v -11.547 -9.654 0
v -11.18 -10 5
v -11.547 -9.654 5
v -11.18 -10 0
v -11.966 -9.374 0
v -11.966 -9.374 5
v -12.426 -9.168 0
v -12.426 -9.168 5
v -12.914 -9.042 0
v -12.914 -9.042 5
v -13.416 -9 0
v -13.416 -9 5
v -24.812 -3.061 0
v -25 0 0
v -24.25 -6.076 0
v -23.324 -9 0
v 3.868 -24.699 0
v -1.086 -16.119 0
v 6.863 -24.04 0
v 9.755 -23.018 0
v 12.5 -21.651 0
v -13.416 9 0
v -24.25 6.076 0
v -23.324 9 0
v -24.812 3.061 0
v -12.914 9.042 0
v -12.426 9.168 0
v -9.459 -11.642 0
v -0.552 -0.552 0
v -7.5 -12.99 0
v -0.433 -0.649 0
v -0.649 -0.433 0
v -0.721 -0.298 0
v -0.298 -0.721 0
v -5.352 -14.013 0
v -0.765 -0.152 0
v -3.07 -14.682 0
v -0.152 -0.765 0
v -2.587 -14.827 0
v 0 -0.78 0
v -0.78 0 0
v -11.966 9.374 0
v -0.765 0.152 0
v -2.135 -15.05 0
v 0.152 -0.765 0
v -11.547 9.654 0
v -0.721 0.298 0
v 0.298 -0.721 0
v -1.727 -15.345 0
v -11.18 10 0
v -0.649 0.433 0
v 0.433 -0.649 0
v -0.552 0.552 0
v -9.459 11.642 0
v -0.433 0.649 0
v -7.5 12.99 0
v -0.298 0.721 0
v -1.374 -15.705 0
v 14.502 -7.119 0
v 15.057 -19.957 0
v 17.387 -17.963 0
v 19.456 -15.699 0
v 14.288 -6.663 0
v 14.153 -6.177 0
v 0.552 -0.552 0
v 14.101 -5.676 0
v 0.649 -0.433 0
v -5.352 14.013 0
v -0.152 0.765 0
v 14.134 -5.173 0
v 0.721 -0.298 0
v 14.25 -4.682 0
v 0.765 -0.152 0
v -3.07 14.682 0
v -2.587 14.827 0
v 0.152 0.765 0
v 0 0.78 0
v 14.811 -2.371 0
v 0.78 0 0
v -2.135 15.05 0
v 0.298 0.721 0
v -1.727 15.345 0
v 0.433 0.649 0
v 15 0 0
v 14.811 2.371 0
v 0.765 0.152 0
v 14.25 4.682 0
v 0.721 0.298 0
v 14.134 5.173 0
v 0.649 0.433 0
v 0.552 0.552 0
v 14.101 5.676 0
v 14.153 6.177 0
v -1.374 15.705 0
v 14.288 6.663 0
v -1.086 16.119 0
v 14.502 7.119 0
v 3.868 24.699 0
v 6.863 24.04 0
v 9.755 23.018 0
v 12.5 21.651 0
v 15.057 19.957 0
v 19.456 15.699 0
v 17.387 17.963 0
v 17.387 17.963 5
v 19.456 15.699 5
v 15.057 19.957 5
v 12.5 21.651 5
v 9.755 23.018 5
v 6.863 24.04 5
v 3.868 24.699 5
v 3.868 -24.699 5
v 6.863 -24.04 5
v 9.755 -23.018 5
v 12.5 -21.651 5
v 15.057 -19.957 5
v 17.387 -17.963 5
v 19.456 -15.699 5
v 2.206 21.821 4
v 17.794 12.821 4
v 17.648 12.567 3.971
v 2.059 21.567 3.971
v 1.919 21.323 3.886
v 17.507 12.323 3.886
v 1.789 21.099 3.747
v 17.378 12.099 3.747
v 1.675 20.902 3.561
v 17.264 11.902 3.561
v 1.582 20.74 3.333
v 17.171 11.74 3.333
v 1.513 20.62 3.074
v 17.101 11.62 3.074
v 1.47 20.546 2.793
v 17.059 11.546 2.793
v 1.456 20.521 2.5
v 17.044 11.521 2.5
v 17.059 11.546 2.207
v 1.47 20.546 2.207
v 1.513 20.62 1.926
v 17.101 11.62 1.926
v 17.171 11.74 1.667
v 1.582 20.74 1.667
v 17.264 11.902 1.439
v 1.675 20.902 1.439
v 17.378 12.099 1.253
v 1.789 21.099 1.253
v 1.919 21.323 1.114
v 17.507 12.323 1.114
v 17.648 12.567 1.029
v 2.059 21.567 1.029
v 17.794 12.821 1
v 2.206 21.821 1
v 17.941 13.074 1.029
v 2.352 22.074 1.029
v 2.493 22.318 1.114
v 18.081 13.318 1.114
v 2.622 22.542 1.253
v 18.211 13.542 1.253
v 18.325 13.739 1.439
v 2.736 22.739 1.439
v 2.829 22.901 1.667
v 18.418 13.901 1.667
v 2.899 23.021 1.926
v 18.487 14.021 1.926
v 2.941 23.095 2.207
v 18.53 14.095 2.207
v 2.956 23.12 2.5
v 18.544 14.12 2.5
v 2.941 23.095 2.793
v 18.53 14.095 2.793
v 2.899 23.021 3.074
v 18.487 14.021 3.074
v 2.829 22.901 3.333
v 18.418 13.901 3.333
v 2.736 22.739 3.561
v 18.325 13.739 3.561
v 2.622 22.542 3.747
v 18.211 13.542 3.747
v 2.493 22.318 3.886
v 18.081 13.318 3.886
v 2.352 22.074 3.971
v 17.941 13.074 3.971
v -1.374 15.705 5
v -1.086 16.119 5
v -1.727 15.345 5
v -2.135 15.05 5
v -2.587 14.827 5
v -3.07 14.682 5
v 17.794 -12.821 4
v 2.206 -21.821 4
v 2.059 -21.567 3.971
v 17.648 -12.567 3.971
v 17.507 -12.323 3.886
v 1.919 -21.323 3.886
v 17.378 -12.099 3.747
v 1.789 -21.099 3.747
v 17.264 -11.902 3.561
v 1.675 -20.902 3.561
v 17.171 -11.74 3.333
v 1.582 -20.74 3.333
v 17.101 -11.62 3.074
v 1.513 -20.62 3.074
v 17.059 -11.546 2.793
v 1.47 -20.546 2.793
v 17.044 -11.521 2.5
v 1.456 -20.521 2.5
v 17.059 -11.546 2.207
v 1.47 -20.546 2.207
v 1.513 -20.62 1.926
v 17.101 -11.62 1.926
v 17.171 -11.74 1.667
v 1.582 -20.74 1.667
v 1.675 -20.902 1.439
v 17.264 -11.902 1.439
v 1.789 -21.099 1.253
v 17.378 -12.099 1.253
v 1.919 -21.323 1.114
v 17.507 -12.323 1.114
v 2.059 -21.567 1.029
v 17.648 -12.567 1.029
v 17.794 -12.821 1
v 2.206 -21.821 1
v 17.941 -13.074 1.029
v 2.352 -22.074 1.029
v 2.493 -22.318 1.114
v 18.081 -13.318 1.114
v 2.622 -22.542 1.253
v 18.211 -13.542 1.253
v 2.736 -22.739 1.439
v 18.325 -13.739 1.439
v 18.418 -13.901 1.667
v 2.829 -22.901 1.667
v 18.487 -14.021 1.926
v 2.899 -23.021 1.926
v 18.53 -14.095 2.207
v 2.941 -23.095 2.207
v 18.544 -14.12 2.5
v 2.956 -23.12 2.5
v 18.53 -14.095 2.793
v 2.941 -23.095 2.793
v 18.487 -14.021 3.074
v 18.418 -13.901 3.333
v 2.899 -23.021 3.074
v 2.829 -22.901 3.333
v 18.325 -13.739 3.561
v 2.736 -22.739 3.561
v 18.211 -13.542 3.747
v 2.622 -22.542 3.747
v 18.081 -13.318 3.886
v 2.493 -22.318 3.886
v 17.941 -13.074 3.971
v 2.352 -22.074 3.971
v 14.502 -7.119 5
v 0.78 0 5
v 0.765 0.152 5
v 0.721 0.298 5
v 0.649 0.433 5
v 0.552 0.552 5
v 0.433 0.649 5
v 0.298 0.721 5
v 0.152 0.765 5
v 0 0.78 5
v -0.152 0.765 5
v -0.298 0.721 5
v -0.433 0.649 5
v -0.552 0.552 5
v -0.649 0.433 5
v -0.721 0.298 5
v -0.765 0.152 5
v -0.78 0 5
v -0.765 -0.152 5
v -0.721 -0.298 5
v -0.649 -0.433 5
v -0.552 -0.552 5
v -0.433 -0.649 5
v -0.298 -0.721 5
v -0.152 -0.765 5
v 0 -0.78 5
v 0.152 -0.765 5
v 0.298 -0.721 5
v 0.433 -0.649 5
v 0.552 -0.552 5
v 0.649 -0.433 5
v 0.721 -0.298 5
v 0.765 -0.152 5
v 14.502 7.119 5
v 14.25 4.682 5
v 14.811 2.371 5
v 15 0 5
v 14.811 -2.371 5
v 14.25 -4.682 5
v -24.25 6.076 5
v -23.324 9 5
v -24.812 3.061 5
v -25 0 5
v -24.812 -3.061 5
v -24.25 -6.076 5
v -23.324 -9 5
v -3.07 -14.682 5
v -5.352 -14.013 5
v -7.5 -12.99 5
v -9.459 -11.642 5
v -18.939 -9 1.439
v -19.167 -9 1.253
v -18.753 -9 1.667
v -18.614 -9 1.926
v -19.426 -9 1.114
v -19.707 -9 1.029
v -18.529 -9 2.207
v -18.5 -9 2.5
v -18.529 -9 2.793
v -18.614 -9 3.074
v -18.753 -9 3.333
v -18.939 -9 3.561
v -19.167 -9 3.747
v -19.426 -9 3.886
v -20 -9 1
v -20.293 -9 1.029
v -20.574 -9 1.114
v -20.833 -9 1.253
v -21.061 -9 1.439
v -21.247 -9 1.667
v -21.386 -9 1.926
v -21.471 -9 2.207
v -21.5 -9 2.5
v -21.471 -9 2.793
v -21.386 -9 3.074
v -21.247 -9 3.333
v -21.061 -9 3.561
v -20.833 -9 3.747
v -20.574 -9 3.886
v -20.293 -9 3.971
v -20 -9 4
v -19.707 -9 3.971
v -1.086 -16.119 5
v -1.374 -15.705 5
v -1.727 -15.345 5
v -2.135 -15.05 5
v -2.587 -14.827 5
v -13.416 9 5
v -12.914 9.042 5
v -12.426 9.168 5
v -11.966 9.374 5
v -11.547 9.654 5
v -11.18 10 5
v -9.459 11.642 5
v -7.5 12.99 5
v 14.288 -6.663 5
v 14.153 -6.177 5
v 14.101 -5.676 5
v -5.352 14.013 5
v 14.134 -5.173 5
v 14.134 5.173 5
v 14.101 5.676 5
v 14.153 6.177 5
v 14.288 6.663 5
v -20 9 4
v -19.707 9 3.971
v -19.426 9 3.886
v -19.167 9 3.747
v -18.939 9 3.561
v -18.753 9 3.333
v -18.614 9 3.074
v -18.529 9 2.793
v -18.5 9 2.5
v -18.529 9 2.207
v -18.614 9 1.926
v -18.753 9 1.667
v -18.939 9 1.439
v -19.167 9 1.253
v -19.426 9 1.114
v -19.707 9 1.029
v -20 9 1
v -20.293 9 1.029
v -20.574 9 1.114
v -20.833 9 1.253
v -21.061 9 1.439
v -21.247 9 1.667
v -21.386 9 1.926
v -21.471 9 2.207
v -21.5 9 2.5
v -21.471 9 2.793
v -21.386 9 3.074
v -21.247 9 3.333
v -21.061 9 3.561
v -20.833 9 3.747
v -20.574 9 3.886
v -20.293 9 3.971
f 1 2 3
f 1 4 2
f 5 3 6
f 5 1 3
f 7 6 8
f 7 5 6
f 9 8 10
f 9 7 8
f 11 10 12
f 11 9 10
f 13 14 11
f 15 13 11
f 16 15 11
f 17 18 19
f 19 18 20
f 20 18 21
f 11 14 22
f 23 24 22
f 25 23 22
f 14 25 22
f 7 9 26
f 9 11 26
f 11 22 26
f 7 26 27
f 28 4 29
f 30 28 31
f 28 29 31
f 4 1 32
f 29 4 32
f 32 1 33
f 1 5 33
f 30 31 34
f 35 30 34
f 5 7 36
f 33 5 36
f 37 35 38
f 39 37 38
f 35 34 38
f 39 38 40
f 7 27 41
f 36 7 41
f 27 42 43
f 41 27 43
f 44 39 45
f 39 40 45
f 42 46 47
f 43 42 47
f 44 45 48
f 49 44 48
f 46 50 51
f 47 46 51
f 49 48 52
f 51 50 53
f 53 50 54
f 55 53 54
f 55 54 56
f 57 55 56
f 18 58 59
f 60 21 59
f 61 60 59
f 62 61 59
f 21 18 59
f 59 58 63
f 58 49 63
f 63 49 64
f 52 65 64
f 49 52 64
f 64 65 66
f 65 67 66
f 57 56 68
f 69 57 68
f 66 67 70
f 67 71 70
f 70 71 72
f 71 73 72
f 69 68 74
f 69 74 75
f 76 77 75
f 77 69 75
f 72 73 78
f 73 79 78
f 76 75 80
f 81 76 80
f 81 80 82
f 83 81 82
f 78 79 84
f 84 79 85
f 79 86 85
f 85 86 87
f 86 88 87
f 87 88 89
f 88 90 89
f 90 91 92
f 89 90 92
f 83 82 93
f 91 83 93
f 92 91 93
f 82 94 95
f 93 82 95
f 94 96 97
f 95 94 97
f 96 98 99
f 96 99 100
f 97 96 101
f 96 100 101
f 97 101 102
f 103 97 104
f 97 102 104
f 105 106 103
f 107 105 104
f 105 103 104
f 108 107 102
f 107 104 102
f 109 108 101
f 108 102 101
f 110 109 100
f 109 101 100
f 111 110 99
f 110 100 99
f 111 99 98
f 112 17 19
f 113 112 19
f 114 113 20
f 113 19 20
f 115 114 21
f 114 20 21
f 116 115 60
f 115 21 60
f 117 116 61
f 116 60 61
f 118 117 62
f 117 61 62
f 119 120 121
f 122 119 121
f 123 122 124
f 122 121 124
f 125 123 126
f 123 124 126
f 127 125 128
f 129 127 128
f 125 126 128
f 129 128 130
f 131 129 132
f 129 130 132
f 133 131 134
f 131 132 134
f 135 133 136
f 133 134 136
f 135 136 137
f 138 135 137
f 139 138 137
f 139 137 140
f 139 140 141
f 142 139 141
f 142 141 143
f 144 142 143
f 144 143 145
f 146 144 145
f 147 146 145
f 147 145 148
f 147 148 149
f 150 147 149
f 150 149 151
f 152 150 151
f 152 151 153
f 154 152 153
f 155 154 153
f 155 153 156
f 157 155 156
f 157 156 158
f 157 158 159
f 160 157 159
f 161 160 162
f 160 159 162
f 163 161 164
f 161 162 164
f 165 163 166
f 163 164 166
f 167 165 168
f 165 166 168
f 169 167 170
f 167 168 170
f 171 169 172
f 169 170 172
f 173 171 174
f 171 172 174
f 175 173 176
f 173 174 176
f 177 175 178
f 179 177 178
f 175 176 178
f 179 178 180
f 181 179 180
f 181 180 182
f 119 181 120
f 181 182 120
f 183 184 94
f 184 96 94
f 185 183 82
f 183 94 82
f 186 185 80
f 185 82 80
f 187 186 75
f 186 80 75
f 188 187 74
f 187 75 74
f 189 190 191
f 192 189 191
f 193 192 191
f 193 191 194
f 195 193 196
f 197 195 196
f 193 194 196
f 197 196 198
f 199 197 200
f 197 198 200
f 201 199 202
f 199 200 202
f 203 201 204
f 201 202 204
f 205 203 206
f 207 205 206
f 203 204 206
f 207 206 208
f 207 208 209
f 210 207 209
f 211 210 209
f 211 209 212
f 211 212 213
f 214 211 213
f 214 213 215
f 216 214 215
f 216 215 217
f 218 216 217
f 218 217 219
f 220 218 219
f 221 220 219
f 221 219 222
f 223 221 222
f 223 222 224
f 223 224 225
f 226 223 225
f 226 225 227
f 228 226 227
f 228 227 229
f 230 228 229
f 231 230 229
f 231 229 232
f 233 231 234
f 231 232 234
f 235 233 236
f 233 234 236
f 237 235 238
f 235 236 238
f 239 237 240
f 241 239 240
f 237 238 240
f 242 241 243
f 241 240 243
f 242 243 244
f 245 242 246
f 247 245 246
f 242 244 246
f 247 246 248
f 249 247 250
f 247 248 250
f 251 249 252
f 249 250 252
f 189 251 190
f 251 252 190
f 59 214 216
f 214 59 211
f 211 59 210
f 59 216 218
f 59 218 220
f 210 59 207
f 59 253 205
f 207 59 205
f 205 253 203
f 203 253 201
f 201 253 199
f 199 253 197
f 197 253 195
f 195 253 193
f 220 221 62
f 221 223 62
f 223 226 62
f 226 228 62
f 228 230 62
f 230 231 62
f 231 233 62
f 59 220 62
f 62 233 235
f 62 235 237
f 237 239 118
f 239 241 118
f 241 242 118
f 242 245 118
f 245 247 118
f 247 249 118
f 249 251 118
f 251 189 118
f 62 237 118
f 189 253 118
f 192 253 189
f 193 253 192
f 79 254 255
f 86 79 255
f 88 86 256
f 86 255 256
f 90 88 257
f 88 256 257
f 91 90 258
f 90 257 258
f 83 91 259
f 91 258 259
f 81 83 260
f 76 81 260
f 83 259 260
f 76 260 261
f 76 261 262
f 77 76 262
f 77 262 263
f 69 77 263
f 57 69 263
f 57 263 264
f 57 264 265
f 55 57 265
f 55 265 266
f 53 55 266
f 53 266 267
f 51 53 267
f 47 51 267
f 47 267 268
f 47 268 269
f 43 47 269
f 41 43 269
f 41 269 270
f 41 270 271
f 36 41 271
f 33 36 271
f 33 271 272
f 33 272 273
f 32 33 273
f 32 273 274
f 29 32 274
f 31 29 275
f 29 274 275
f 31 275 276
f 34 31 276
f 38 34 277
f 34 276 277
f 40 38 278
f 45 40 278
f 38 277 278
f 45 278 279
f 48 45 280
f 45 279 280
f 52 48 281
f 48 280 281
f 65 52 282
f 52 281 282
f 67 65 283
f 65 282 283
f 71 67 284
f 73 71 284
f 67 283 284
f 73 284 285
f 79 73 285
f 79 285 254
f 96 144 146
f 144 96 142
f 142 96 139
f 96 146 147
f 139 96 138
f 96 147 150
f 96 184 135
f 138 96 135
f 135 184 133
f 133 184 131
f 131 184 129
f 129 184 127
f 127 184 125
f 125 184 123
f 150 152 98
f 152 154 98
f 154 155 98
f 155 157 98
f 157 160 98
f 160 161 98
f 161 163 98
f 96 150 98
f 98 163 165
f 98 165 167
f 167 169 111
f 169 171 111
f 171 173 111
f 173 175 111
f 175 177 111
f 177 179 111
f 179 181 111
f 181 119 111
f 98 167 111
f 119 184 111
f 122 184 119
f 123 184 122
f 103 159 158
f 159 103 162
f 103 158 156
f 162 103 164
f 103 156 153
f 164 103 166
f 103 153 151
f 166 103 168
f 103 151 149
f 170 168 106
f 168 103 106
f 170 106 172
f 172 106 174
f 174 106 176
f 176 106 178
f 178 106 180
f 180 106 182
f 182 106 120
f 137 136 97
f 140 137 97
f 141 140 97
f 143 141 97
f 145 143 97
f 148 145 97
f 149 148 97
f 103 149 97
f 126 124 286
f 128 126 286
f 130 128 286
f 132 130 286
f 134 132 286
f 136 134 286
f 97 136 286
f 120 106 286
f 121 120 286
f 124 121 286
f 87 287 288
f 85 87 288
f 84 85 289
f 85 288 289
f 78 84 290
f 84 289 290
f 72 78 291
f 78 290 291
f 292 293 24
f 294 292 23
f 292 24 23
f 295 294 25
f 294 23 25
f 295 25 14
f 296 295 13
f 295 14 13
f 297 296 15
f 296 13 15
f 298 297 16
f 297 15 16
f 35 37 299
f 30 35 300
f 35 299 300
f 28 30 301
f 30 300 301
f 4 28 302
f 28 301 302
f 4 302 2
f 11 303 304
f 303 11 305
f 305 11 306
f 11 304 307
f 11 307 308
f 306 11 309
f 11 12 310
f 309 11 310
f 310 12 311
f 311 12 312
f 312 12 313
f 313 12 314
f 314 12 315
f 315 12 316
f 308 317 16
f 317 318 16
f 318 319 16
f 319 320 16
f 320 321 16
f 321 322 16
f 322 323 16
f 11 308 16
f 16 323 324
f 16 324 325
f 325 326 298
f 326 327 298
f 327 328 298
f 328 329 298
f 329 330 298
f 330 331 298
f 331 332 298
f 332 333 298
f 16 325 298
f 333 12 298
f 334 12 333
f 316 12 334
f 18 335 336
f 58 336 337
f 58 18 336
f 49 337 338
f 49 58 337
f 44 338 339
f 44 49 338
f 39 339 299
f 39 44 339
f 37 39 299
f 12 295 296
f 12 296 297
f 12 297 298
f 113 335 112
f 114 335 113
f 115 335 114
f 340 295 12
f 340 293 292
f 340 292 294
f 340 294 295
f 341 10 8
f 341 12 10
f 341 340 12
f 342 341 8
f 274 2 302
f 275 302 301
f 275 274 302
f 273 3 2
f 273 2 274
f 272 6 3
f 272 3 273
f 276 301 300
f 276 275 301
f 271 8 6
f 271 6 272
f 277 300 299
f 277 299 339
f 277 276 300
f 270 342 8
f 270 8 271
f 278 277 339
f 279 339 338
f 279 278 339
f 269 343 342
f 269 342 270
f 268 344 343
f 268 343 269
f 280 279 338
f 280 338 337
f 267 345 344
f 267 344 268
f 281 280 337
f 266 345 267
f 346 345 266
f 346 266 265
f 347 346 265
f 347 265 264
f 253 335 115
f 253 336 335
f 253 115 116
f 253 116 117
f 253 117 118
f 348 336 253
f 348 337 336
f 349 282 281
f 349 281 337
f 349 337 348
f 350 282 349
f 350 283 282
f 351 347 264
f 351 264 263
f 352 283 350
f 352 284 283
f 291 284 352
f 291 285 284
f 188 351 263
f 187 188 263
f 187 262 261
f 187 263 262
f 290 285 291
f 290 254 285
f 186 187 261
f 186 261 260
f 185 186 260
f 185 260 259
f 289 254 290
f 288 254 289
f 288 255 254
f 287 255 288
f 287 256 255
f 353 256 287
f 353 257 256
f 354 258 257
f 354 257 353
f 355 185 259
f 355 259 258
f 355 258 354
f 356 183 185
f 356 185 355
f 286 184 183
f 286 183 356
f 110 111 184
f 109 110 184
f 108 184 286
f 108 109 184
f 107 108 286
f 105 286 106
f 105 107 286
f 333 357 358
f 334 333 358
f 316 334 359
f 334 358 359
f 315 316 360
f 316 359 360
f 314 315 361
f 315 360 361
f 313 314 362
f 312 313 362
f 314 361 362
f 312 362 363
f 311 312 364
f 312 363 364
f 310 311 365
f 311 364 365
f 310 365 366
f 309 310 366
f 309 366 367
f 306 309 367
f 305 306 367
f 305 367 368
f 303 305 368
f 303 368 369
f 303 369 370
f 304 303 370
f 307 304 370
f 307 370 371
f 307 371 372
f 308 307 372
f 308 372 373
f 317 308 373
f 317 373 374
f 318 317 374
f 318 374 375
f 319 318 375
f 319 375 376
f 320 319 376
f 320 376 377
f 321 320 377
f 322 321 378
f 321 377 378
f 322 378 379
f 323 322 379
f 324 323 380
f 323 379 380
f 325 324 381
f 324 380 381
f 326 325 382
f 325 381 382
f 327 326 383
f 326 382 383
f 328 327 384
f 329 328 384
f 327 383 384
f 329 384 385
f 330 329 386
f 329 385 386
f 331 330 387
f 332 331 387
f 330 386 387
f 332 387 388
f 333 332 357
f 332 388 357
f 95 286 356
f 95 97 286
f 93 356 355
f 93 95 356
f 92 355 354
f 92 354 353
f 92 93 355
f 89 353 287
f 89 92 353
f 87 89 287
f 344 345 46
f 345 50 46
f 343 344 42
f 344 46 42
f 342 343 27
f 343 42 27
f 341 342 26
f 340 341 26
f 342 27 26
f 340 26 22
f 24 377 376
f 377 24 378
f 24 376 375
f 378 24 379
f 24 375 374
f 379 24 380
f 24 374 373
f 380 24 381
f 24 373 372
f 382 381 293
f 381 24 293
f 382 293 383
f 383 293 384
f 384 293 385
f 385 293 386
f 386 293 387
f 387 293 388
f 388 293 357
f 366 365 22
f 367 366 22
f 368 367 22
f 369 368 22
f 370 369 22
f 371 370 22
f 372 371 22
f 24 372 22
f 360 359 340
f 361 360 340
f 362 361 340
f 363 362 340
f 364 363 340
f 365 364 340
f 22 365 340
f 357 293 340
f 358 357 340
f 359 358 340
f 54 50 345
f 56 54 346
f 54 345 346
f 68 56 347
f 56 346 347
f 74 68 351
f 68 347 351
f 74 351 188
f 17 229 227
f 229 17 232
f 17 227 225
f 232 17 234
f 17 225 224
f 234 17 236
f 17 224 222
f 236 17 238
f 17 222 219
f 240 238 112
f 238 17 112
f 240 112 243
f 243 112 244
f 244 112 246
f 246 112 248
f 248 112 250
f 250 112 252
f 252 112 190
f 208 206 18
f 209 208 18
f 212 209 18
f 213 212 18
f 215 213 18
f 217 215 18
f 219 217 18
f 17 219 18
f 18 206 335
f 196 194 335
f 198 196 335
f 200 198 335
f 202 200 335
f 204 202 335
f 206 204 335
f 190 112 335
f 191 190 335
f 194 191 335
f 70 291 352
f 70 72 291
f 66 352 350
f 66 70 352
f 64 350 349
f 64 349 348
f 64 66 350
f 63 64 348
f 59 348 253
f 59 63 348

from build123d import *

# Parameters (mm, degrees)
SKIZZE1_R                       = 25
AUFSATZ_LINEAR_AUSTRAGEN1_DEPTH = 5
SCHNITT_LINEAR_AUSTRAGEN1_DEPTH = 36.707142143
SKIZZE3_R                       = 1.5
SCHNITT_LINEAR_AUSTRAGEN2_DEPTH = 43.256635771
KREISMUSTER1_COUNT              = 3
SKIZZE6_R                       = 0.78
SCHNITT_LINEAR_AUSTRAGEN5_DEPTH = 36.497057468
VERRUNDUNG1_R                   = 3


with BuildPart() as part:
    # Skizze1 → Aufsatz-Linear austragen1 (new body)
    with BuildSketch(Plane.XY):
        Circle(SKIZZE1_R)
    extrude(amount=AUFSATZ_LINEAR_AUSTRAGEN1_DEPTH)

    # Skizze2 → Schnitt-Linear austragen1 (cut, through all)
    with BuildSketch(Plane.XY.offset(5)):
        with BuildLine():
            Line((19.456132424, 15.699009877), (13.794228634, 5.892304845))
            ThreePointArc((13.794228634, 5.892304845), (15, 0), (13.794228634, -5.892304845))
            Line((13.794228634, -5.892304845), (19.456132424, -15.699009877))
            ThreePointArc((19.456132424, -15.699009877), (25, 0), (19.456132424, 15.699009877))
        make_face()
        with BuildLine():
            Line((-23.323807579, 9), (-12, 9))
            ThreePointArc((-12, 9), (-7.5, 12.990381057), (-1.794228634, 14.892304845))
            Line((-1.794228634, 14.892304845), (3.867675156, 24.699009877))
            ThreePointArc((3.867675156, 24.699009877), (-12.5, 21.650635095), (-23.323807579, 9))
        make_face()
        with BuildLine():
            Line((3.867675156, -24.699009877), (-1.794228634, -14.892304845))
            ThreePointArc((-1.794228634, -14.892304845), (-7.5, -12.990381057), (-12, -9))
            Line((-12, -9), (-23.323807579, -9))
            ThreePointArc((-23.323807579, -9), (-12.5, -21.650635095), (3.867675156, -24.699009877))
        make_face()
    extrude(amount=-SCHNITT_LINEAR_AUSTRAGEN1_DEPTH, mode=Mode.SUBTRACT)

    # Skizze3 → Schnitt-Linear austragen2 (cut, through all)
    with BuildSketch(Plane(origin=(0, 9, 0), x_dir=(1, 0, 0), z_dir=(0, 1, 0))):
        with Locations(Location((-20, -2.5, 0), (0, 0, 270))):
            Circle(SKIZZE3_R)
    schnitt_linear_austragen2 = extrude(amount=-SCHNITT_LINEAR_AUSTRAGEN2_DEPTH, mode=Mode.SUBTRACT)

    # Kreismuster1: Schnitt-Linear austragen2 ×3 about axis
    kreismuster1_axis = Axis((0, 0, 5), (0, 0, -1))
    for i in range(1, KREISMUSTER1_COUNT):
        add(schnitt_linear_austragen2.rotate(kreismuster1_axis, i * 360 / KREISMUSTER1_COUNT), mode=Mode.SUBTRACT)

    # Skizze6 → Schnitt-Linear austragen5 (cut, through all)
    with BuildSketch(Plane.XY.offset(5)):
        Circle(SKIZZE6_R)
    extrude(amount=-SCHNITT_LINEAR_AUSTRAGEN5_DEPTH, mode=Mode.SUBTRACT)

    # Verrundung1
    verrundung1_edges = [part.edges().sort_by_distance(p)[0] for p in [
        (-1.794228634, 14.892304845, 2.5),
        (-12, 9, 2.5),
        (-12, -9, 2.5),
        (-1.794228634, -14.892304845, 2.5),
        (13.794228634, -5.892304845, 2.5),
        (13.794228634, 5.892304845, 2.5),
    ]]
    fillet(verrundung1_edges, radius=VERRUNDUNG1_R)


solid = part.part
